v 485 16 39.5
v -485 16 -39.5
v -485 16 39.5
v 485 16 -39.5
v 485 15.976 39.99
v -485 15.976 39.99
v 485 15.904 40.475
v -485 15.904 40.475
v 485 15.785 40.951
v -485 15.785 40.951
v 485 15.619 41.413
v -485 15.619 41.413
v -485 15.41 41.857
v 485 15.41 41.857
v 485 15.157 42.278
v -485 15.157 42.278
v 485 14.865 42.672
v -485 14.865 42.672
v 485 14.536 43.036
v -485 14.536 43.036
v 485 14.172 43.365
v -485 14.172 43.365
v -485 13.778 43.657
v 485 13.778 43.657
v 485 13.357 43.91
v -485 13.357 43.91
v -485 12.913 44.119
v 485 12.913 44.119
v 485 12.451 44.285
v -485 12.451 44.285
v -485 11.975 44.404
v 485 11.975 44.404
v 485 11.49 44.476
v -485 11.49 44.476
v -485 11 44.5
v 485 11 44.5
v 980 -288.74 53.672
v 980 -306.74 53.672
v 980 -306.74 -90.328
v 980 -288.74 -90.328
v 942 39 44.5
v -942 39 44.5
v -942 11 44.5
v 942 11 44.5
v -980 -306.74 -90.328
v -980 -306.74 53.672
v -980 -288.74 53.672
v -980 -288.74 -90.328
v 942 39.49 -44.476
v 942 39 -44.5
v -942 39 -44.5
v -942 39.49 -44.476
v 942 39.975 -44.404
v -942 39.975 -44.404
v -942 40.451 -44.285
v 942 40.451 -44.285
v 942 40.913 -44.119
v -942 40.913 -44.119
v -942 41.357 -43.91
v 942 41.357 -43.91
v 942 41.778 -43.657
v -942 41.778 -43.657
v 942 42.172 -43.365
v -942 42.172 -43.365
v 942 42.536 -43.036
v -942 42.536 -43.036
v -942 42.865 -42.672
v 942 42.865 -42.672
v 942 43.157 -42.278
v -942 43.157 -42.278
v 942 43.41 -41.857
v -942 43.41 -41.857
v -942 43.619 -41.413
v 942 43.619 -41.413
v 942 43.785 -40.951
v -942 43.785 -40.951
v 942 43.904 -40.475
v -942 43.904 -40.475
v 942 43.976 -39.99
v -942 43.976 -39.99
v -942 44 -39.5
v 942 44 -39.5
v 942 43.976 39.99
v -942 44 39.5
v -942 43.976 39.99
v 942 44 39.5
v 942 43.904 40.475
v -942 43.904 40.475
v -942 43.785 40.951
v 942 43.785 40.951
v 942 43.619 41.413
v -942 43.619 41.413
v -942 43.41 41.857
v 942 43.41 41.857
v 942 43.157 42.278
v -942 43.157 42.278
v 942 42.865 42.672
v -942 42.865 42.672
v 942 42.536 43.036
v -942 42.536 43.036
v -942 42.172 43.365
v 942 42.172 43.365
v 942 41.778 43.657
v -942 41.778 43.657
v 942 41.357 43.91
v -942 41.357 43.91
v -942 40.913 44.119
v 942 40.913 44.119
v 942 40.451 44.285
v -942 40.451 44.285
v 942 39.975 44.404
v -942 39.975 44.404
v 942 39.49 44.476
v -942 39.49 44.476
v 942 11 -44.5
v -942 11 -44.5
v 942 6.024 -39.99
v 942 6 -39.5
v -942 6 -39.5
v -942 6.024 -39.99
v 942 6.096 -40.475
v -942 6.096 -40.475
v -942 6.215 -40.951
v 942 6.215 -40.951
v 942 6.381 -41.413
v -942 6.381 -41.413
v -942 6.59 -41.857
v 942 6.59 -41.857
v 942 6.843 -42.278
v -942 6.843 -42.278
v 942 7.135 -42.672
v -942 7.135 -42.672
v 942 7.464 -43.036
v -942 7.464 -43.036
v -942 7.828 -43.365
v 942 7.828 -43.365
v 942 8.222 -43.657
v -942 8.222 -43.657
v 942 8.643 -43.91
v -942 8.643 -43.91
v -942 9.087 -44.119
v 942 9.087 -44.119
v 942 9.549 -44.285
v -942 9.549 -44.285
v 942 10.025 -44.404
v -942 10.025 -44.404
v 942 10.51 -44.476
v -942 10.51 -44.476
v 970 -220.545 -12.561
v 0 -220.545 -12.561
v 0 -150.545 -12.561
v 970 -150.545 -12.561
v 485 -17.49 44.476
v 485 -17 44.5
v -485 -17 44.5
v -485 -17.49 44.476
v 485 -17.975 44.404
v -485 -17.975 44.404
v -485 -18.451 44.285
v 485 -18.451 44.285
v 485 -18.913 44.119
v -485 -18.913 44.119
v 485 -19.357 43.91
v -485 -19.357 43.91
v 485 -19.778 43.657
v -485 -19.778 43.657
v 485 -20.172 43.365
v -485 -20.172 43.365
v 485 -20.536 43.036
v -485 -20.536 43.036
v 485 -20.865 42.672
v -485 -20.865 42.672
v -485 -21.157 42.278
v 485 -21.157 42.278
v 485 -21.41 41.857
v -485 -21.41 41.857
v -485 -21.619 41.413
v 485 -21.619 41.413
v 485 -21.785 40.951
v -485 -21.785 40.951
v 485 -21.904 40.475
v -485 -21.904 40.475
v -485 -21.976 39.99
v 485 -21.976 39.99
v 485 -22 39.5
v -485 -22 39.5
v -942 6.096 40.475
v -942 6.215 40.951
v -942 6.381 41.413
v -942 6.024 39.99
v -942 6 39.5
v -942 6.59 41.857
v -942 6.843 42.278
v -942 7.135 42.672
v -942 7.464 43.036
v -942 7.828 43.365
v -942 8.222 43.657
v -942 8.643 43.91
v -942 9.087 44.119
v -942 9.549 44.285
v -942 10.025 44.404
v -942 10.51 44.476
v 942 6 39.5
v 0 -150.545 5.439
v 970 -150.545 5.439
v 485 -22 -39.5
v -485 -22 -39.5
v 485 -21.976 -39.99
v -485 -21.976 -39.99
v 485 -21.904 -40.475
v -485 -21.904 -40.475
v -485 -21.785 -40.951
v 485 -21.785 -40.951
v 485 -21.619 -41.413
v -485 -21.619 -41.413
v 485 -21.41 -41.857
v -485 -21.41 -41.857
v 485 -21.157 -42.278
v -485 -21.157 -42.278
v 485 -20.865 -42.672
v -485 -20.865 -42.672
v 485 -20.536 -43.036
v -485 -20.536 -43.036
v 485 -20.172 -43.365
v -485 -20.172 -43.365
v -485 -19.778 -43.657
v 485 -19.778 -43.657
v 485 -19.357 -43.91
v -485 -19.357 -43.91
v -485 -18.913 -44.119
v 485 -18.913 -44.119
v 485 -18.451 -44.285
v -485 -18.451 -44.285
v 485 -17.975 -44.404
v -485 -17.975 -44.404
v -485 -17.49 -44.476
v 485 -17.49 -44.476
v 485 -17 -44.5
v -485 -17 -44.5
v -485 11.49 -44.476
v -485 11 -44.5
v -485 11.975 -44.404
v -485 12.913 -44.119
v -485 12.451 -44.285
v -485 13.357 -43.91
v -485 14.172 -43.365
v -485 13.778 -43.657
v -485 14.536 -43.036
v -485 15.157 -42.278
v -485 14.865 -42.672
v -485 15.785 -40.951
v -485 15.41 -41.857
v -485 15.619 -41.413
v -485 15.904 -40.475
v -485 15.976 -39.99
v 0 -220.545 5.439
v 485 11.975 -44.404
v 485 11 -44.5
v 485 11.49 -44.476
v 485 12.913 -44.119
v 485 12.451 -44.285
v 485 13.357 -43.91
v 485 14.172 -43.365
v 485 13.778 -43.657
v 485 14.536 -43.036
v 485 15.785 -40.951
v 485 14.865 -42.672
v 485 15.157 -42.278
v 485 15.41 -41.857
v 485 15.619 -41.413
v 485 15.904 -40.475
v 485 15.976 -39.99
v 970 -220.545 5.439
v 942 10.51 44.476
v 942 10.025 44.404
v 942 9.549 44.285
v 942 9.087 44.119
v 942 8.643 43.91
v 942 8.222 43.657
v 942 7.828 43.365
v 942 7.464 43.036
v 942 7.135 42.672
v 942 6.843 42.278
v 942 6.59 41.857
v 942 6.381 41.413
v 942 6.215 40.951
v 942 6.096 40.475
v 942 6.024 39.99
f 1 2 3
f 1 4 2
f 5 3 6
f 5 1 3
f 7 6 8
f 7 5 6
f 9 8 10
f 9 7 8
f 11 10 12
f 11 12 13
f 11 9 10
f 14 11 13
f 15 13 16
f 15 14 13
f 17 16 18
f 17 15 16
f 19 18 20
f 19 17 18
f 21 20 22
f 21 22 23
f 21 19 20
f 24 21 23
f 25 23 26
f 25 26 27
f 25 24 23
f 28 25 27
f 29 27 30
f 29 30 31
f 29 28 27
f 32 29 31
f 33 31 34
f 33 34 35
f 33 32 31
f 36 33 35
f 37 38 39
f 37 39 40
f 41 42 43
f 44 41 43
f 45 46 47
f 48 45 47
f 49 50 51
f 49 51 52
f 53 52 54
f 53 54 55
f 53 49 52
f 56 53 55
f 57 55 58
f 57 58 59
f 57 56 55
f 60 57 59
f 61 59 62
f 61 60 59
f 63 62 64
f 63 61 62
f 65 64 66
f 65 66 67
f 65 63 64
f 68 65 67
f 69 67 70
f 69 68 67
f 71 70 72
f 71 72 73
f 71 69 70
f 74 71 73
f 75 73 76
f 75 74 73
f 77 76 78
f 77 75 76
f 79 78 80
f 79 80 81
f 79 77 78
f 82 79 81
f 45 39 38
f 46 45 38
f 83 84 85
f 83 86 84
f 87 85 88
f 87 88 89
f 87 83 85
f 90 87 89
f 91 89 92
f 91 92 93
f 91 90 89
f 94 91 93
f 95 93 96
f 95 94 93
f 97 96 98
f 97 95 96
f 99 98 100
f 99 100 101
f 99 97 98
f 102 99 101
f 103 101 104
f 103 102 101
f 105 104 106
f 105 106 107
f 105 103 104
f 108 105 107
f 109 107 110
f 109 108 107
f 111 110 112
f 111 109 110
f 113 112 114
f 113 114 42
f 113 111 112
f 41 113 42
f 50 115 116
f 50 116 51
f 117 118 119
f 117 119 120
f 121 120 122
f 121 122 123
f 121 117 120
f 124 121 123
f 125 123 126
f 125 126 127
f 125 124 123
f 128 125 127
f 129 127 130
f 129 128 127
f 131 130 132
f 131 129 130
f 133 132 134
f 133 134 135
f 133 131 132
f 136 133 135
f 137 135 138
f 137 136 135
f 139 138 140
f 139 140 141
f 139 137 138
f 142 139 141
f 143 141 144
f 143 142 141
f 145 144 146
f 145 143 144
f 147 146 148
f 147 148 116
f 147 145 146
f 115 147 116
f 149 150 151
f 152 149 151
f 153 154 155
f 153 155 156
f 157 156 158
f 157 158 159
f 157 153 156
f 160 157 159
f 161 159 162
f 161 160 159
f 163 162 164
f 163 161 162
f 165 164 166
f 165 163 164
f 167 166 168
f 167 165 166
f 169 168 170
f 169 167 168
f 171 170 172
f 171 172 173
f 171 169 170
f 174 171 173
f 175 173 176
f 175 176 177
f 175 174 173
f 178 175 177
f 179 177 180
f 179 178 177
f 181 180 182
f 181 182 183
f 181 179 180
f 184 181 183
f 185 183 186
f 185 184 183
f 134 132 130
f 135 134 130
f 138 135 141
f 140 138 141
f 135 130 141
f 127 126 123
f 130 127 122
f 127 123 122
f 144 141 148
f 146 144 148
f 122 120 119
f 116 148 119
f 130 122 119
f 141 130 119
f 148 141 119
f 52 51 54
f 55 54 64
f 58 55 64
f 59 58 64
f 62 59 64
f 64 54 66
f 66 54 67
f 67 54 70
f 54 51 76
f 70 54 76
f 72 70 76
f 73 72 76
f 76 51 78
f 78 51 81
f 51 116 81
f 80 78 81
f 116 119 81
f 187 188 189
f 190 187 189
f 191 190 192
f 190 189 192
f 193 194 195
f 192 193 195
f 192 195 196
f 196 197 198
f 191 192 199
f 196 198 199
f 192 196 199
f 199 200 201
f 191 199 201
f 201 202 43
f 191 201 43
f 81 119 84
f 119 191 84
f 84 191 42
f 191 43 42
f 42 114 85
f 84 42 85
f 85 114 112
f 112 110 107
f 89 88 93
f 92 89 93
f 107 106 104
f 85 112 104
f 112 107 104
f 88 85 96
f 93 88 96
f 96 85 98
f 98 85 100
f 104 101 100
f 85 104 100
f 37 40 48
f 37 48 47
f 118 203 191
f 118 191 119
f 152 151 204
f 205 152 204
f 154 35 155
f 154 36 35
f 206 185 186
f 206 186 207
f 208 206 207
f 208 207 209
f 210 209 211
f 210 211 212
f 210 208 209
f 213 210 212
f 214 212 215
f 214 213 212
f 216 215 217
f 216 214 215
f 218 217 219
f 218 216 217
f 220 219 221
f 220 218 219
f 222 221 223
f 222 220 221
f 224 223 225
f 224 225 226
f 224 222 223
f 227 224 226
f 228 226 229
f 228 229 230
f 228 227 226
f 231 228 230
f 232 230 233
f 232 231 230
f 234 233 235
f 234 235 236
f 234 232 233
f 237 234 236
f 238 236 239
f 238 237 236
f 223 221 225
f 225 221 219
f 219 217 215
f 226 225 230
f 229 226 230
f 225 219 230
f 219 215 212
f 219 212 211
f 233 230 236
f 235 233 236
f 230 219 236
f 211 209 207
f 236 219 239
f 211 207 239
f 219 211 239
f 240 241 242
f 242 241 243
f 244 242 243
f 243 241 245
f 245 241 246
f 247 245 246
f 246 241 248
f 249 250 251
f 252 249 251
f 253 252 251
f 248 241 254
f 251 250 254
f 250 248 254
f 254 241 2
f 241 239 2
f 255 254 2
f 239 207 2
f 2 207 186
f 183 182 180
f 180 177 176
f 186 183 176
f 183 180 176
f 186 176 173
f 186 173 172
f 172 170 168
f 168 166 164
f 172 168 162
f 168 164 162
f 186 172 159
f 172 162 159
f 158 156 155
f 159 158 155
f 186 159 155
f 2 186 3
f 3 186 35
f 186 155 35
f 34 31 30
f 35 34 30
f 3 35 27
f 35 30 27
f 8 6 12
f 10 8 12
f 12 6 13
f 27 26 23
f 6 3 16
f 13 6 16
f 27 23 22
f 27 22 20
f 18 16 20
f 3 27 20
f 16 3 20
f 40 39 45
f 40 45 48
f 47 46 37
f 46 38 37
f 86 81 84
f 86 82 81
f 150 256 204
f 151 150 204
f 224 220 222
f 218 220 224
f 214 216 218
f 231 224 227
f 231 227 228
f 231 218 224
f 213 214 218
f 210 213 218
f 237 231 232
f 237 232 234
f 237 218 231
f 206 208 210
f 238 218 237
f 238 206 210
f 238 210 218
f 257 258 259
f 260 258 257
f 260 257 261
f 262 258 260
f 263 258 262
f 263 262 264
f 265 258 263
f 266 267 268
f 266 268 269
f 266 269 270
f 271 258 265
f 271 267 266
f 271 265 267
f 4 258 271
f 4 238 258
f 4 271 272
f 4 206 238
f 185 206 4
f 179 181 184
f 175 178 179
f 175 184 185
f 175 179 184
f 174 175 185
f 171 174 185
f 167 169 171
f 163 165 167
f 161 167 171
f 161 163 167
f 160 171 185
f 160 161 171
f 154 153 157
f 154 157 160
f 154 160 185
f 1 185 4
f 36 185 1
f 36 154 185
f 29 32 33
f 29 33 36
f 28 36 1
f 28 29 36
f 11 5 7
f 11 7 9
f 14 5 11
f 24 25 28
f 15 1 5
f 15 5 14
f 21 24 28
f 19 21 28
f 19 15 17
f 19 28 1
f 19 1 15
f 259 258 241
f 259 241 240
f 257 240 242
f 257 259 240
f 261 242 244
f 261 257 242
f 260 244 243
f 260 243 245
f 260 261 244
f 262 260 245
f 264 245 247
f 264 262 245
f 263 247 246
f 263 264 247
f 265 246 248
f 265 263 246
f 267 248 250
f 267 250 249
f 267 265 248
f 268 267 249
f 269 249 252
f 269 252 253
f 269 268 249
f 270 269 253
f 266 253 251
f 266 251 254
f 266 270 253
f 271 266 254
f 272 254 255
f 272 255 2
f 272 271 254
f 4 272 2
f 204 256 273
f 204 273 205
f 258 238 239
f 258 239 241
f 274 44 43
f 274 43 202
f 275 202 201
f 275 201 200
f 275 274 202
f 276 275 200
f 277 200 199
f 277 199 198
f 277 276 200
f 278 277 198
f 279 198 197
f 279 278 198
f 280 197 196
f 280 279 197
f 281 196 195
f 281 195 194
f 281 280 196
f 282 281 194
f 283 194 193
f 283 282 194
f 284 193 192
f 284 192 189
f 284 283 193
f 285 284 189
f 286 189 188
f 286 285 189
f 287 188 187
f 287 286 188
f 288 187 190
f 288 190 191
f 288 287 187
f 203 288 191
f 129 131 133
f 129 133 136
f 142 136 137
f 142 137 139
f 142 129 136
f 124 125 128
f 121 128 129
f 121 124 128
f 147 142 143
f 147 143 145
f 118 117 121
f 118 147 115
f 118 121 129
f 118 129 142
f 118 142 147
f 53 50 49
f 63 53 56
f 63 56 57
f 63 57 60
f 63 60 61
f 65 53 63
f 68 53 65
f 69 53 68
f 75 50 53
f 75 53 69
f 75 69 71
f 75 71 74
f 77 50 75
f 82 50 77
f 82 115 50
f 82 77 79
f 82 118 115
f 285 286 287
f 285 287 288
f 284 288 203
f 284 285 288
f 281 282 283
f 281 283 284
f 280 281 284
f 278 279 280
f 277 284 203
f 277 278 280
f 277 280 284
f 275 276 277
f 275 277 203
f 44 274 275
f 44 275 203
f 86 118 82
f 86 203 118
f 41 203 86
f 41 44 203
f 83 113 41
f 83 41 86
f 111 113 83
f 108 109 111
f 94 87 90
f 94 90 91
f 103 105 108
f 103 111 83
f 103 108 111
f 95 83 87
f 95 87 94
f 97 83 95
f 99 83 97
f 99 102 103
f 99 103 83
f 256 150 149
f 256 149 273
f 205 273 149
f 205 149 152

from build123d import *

# Parameters (mm, degrees)
F1_DEPTH = 942
F2_W     = 18
F2_H     = 144
F3_DEPTH = 980
F5_DEPTH = 485
F6_W     = 70
F6_H     = 18
F7_DEPTH = 970


with BuildPart() as f1:
    # F0 (on Right) → F1 (new body, symmetric)
    with BuildSketch(Plane.YZ):
        with BuildLine():
            Line((39, 44.5), (11, 44.5))
            ThreePointArc((11, 44.5), (7.4644660941, 43.0355339059), (6, 39.5))
            Line((6, 39.5), (6, -39.5))
            ThreePointArc((6, -39.5), (7.4644660941, -43.0355339059), (11, -44.5))
            Line((11, -44.5), (39, -44.5))
            ThreePointArc((39, -44.5), (42.5355339059, -43.0355339059), (44, -39.5))
            Line((44, -39.5), (44, 39.5))
            ThreePointArc((44, 39.5), (42.5355339059, 43.0355339059), (39, 44.5))
        make_face()
    extrude(amount=F1_DEPTH, both=True)


with BuildPart() as f3:
    # F2 (on Right) → F3 (new body, symmetric)
    with BuildSketch(Plane.YZ):
        with Locations((-297.740265727, -18.3279789912)):
            Rectangle(F2_W, F2_H)
    extrude(amount=F3_DEPTH, both=True)


with BuildPart() as f5:
    # F4 (on Right) → F5 (new body, symmetric)
    with BuildSketch(Plane.YZ):
        with BuildLine():
            Line((11, 44.5), (-17, 44.5))
            ThreePointArc((-17, 44.5), (-20.5355339059, 43.0355339059), (-22, 39.5))
            Line((-22, 39.5), (-22, -39.5))
            ThreePointArc((-22, -39.5), (-20.5355339059, -43.0355339059), (-17, -44.5))
            Line((-17, -44.5), (11, -44.5))
            ThreePointArc((11, -44.5), (14.5355339059, -43.0355339059), (16, -39.5))
            Line((16, -39.5), (16, 39.5))
            ThreePointArc((16, 39.5), (14.5355339059, 43.0355339059), (11, 44.5))
        make_face()
    extrude(amount=F5_DEPTH, both=True)


with BuildPart() as f7:
    # F6 (on Right) → F7 (new body)
    with BuildSketch(Plane.YZ):
        with Locations((-185.544824217, -3.5608911421)):
            Rectangle(F6_W, F6_H)
    extrude(amount=F7_DEPTH)


solid = Compound([f1.part, f3.part, f5.part, f7.part])
